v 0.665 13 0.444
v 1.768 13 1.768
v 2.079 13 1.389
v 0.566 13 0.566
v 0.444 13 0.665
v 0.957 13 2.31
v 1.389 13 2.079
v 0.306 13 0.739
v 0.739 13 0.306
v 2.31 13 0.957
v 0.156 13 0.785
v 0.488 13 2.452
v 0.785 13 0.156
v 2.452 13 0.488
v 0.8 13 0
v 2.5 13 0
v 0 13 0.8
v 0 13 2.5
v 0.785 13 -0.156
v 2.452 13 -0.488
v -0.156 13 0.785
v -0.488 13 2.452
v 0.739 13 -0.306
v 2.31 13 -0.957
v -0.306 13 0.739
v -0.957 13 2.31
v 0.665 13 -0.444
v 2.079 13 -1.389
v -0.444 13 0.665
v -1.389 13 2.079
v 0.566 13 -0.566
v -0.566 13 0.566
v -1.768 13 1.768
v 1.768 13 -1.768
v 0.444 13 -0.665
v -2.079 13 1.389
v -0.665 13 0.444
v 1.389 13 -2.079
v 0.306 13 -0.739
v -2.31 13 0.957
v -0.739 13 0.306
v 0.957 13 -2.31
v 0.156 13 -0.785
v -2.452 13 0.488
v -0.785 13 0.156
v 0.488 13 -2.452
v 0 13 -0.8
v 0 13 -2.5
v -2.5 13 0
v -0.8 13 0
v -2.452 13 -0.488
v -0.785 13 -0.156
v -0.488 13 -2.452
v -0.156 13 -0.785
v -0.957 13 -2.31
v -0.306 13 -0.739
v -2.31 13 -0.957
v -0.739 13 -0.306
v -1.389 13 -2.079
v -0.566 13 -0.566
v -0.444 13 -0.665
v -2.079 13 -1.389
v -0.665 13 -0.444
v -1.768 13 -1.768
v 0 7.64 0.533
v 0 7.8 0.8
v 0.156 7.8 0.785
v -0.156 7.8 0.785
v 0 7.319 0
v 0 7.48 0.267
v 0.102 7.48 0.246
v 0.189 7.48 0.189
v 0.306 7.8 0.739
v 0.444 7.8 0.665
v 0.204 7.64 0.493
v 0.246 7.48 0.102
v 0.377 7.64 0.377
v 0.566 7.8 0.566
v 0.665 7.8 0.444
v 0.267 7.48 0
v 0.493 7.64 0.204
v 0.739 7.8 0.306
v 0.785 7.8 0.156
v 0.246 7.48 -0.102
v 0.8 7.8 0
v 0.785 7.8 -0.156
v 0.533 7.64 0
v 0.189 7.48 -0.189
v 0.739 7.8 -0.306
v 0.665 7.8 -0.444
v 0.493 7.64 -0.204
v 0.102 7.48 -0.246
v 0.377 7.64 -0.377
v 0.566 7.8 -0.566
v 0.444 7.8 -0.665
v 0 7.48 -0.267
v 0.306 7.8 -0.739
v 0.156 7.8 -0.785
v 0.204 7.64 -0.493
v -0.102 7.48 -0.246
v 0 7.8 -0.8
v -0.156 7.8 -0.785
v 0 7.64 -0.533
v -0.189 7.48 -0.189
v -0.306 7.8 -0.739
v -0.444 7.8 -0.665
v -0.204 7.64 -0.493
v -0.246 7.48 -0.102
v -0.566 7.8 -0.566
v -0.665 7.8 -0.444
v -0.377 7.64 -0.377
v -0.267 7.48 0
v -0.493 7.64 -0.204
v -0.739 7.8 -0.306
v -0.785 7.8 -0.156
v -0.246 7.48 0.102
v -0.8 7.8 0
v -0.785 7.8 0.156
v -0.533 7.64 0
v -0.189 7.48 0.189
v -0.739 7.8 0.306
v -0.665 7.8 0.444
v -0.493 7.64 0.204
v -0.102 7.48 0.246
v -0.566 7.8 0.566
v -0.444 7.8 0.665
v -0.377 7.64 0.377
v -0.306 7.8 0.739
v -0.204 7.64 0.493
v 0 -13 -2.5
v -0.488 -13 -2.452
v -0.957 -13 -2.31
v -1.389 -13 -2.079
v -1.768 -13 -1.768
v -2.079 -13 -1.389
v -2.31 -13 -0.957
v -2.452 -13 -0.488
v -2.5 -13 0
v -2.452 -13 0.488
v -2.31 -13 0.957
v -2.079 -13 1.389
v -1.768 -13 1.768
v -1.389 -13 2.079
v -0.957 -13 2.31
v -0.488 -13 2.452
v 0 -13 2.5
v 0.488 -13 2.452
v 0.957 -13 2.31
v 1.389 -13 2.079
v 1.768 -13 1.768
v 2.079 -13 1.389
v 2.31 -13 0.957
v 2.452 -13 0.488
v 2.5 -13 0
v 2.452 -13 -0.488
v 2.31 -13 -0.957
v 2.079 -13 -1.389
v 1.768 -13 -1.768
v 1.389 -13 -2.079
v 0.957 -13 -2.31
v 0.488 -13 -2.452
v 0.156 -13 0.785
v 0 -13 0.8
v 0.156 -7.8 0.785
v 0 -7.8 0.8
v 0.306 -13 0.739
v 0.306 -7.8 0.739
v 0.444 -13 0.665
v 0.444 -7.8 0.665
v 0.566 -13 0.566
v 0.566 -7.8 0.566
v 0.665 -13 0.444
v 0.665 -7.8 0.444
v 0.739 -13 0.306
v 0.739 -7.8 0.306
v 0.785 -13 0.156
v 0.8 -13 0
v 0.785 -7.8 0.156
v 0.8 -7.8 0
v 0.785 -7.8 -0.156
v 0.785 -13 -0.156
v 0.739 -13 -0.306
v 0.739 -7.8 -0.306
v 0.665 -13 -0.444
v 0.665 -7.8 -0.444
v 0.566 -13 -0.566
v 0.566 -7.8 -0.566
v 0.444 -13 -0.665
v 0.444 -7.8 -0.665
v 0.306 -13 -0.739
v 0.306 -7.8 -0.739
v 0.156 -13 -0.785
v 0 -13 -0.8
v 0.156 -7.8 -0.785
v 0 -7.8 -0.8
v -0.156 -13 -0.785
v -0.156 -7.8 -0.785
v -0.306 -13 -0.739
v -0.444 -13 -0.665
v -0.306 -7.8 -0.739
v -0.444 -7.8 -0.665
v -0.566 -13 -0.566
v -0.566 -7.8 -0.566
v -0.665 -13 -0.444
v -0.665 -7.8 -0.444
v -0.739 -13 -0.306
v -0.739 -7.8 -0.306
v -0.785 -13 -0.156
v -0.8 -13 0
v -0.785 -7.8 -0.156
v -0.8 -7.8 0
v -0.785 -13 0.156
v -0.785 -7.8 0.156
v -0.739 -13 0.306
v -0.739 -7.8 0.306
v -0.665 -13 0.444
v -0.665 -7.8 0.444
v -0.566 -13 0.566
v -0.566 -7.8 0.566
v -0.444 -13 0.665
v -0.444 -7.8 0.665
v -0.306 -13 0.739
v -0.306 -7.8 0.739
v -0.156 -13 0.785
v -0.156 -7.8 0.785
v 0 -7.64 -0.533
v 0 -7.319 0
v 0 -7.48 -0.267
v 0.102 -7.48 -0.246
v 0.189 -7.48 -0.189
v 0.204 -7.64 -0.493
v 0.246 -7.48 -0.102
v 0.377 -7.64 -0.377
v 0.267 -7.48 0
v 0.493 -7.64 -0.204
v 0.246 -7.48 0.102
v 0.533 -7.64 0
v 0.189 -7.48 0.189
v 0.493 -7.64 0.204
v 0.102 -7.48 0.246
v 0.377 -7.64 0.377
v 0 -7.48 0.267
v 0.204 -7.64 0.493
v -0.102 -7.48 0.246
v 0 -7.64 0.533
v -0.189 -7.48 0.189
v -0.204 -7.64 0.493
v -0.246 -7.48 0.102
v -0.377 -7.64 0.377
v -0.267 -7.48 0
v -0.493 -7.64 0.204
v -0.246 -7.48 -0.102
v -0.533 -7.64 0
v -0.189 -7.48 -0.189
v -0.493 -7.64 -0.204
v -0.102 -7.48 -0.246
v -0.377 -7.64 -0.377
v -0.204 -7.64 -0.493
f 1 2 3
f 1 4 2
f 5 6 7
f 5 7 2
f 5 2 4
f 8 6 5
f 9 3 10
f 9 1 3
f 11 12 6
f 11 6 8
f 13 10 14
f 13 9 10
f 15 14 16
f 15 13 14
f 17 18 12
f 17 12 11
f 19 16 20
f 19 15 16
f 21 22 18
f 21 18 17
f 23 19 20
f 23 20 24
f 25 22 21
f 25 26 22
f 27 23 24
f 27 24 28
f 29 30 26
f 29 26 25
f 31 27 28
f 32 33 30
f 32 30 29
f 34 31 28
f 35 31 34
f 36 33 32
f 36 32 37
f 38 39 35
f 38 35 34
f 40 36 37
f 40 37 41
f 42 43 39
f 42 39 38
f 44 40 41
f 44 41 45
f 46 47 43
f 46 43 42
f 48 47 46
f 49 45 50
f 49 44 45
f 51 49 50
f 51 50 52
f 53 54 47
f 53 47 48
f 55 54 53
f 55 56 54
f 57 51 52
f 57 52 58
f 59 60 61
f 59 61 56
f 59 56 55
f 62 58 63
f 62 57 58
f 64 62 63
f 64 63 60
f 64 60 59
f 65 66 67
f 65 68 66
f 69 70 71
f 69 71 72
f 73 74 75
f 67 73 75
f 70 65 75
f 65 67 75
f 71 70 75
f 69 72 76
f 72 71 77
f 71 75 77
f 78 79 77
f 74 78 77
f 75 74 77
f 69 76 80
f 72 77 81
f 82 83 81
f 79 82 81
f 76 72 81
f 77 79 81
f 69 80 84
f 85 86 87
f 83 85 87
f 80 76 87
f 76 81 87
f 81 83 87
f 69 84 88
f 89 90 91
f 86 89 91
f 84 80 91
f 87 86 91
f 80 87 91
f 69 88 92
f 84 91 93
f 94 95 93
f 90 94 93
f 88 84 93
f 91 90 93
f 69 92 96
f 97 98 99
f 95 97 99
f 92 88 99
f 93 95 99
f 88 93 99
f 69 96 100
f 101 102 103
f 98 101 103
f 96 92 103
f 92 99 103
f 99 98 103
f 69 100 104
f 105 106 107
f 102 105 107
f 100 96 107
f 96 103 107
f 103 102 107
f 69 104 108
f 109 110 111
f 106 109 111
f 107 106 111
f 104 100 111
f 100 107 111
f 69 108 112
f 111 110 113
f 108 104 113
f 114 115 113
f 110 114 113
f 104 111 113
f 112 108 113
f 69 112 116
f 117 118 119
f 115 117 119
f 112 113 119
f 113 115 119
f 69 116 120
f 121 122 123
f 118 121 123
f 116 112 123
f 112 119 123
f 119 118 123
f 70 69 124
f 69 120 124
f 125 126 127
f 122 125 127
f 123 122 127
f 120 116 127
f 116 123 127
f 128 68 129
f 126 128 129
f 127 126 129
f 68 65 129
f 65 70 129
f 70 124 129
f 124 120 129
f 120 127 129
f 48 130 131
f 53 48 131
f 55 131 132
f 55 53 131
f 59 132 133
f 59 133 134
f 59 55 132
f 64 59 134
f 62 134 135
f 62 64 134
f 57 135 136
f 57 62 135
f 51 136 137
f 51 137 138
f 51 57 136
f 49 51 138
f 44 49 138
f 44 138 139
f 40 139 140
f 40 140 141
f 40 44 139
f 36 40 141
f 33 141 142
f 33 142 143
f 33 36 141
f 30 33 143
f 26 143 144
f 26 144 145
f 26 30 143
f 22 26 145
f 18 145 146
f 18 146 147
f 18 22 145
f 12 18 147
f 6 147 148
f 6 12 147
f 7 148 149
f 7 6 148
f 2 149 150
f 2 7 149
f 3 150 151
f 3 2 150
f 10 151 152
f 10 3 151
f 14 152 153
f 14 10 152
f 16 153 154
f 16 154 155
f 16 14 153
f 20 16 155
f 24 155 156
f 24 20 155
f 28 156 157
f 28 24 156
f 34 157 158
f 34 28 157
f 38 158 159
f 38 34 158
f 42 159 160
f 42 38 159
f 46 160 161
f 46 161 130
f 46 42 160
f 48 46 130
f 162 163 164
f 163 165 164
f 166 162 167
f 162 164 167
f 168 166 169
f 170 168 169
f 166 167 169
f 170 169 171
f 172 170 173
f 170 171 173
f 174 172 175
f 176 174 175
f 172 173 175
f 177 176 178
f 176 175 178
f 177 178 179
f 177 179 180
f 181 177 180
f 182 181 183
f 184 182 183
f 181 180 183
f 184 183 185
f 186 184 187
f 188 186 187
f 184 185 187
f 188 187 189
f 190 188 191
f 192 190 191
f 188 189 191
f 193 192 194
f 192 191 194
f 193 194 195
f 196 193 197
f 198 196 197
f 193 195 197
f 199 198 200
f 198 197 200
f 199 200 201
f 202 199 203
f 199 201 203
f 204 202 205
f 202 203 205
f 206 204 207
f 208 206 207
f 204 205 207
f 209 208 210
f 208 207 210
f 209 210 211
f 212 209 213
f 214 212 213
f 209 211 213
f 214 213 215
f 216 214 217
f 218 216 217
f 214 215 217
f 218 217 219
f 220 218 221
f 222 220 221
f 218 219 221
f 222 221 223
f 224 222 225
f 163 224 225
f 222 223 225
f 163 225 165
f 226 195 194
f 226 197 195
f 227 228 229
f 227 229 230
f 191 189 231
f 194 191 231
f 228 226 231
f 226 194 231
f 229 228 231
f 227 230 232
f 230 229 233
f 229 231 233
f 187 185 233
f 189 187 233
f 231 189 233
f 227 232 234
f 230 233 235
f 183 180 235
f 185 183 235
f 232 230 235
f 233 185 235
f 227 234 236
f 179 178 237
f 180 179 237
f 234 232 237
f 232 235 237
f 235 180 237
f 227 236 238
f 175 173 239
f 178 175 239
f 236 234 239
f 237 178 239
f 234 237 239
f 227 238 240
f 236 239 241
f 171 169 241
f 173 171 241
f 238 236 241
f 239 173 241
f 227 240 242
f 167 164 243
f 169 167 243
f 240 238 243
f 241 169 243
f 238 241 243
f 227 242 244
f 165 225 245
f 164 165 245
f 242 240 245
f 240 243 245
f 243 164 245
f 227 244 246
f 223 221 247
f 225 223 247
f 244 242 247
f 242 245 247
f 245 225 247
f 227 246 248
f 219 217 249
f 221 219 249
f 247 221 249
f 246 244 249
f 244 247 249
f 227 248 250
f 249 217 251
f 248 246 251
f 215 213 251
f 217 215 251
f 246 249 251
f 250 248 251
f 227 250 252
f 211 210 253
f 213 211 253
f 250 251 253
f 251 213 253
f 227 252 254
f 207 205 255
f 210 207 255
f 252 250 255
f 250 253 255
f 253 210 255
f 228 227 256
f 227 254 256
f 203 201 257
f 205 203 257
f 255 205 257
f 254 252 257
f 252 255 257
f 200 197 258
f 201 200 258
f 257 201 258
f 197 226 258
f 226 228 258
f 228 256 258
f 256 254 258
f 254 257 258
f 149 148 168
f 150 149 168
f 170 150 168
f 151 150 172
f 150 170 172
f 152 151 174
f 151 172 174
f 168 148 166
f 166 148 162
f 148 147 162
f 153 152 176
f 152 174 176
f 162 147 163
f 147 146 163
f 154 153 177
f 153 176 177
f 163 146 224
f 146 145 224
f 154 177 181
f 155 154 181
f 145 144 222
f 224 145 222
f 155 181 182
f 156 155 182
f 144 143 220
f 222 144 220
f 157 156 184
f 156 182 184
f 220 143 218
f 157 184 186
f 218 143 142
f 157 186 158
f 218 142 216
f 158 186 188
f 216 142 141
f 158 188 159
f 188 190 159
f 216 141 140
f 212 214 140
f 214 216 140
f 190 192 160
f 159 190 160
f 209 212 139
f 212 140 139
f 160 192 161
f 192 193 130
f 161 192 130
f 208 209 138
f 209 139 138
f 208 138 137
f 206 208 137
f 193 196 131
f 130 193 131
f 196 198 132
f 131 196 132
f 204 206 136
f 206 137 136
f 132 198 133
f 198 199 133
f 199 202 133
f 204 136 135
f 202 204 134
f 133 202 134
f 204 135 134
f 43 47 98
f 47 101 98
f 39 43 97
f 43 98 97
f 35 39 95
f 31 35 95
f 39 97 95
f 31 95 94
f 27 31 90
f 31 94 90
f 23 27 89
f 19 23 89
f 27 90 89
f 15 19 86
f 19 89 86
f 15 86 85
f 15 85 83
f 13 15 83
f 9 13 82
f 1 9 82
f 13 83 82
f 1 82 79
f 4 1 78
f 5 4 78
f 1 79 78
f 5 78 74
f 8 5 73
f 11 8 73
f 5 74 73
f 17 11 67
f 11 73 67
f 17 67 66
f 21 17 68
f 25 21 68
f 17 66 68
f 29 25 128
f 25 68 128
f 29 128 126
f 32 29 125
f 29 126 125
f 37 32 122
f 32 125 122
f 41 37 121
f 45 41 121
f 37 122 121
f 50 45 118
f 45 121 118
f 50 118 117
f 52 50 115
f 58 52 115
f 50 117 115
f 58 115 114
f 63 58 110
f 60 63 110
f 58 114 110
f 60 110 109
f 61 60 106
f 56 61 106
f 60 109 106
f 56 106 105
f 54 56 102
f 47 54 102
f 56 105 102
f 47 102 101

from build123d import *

# Parameters (mm, degrees)
SKETCH1_R                           = 2.5
BOSS_EXTRUDE1_DEPTH                 = 13
M2X0_4_TAPPED_HOLE1_D               = 1.6
M2X0_4_TAPPED_HOLE1_DEPTH           = 5.2
M2X0_4_TAPPED_HOLE1_TIP             = 0.480688495
M2X0_4_TAPPED_HOLE1_ON_FACE_2_D     = 1.6
M2X0_4_TAPPED_HOLE1_ON_FACE_2_DEPTH = 5.2
M2X0_4_TAPPED_HOLE1_ON_FACE_2_TIP   = 0.480688495


with BuildPart() as part:
    # Sketch1 → Boss-Extrude1 (new, symmetric)
    with BuildSketch(Plane(origin=(0, 0, 0), x_dir=(1, 0, 0), z_dir=(0, 1, 0))):
        Circle(SKETCH1_R)
    extrude(amount=BOSS_EXTRUDE1_DEPTH, both=True)

    # M2x0.4 Tapped Hole1
    with Locations(Plane.ZX.offset(13)):
        with Locations((0, 0)):
            Hole(M2X0_4_TAPPED_HOLE1_D / 2, depth=M2X0_4_TAPPED_HOLE1_DEPTH)
            with Locations((0, 0, -(M2X0_4_TAPPED_HOLE1_DEPTH + M2X0_4_TAPPED_HOLE1_TIP / 2))):  # 118° drill point
                Cone(0, M2X0_4_TAPPED_HOLE1_D / 2, M2X0_4_TAPPED_HOLE1_TIP, mode=Mode.SUBTRACT)

    # M2x0.4 Tapped Hole1 on face 2
    with Locations(Plane(origin=(0, -13, 0), x_dir=(0, 0, -1), z_dir=(0, -1, 0))):
        with Locations((0, 0)):
            Hole(M2X0_4_TAPPED_HOLE1_ON_FACE_2_D / 2, depth=M2X0_4_TAPPED_HOLE1_ON_FACE_2_DEPTH)
            with Locations((0, 0, -(M2X0_4_TAPPED_HOLE1_ON_FACE_2_DEPTH + M2X0_4_TAPPED_HOLE1_ON_FACE_2_TIP / 2))):  # 118° drill point
                Cone(0, M2X0_4_TAPPED_HOLE1_ON_FACE_2_D / 2, M2X0_4_TAPPED_HOLE1_ON_FACE_2_TIP, mode=Mode.SUBTRACT)


solid = part.part
